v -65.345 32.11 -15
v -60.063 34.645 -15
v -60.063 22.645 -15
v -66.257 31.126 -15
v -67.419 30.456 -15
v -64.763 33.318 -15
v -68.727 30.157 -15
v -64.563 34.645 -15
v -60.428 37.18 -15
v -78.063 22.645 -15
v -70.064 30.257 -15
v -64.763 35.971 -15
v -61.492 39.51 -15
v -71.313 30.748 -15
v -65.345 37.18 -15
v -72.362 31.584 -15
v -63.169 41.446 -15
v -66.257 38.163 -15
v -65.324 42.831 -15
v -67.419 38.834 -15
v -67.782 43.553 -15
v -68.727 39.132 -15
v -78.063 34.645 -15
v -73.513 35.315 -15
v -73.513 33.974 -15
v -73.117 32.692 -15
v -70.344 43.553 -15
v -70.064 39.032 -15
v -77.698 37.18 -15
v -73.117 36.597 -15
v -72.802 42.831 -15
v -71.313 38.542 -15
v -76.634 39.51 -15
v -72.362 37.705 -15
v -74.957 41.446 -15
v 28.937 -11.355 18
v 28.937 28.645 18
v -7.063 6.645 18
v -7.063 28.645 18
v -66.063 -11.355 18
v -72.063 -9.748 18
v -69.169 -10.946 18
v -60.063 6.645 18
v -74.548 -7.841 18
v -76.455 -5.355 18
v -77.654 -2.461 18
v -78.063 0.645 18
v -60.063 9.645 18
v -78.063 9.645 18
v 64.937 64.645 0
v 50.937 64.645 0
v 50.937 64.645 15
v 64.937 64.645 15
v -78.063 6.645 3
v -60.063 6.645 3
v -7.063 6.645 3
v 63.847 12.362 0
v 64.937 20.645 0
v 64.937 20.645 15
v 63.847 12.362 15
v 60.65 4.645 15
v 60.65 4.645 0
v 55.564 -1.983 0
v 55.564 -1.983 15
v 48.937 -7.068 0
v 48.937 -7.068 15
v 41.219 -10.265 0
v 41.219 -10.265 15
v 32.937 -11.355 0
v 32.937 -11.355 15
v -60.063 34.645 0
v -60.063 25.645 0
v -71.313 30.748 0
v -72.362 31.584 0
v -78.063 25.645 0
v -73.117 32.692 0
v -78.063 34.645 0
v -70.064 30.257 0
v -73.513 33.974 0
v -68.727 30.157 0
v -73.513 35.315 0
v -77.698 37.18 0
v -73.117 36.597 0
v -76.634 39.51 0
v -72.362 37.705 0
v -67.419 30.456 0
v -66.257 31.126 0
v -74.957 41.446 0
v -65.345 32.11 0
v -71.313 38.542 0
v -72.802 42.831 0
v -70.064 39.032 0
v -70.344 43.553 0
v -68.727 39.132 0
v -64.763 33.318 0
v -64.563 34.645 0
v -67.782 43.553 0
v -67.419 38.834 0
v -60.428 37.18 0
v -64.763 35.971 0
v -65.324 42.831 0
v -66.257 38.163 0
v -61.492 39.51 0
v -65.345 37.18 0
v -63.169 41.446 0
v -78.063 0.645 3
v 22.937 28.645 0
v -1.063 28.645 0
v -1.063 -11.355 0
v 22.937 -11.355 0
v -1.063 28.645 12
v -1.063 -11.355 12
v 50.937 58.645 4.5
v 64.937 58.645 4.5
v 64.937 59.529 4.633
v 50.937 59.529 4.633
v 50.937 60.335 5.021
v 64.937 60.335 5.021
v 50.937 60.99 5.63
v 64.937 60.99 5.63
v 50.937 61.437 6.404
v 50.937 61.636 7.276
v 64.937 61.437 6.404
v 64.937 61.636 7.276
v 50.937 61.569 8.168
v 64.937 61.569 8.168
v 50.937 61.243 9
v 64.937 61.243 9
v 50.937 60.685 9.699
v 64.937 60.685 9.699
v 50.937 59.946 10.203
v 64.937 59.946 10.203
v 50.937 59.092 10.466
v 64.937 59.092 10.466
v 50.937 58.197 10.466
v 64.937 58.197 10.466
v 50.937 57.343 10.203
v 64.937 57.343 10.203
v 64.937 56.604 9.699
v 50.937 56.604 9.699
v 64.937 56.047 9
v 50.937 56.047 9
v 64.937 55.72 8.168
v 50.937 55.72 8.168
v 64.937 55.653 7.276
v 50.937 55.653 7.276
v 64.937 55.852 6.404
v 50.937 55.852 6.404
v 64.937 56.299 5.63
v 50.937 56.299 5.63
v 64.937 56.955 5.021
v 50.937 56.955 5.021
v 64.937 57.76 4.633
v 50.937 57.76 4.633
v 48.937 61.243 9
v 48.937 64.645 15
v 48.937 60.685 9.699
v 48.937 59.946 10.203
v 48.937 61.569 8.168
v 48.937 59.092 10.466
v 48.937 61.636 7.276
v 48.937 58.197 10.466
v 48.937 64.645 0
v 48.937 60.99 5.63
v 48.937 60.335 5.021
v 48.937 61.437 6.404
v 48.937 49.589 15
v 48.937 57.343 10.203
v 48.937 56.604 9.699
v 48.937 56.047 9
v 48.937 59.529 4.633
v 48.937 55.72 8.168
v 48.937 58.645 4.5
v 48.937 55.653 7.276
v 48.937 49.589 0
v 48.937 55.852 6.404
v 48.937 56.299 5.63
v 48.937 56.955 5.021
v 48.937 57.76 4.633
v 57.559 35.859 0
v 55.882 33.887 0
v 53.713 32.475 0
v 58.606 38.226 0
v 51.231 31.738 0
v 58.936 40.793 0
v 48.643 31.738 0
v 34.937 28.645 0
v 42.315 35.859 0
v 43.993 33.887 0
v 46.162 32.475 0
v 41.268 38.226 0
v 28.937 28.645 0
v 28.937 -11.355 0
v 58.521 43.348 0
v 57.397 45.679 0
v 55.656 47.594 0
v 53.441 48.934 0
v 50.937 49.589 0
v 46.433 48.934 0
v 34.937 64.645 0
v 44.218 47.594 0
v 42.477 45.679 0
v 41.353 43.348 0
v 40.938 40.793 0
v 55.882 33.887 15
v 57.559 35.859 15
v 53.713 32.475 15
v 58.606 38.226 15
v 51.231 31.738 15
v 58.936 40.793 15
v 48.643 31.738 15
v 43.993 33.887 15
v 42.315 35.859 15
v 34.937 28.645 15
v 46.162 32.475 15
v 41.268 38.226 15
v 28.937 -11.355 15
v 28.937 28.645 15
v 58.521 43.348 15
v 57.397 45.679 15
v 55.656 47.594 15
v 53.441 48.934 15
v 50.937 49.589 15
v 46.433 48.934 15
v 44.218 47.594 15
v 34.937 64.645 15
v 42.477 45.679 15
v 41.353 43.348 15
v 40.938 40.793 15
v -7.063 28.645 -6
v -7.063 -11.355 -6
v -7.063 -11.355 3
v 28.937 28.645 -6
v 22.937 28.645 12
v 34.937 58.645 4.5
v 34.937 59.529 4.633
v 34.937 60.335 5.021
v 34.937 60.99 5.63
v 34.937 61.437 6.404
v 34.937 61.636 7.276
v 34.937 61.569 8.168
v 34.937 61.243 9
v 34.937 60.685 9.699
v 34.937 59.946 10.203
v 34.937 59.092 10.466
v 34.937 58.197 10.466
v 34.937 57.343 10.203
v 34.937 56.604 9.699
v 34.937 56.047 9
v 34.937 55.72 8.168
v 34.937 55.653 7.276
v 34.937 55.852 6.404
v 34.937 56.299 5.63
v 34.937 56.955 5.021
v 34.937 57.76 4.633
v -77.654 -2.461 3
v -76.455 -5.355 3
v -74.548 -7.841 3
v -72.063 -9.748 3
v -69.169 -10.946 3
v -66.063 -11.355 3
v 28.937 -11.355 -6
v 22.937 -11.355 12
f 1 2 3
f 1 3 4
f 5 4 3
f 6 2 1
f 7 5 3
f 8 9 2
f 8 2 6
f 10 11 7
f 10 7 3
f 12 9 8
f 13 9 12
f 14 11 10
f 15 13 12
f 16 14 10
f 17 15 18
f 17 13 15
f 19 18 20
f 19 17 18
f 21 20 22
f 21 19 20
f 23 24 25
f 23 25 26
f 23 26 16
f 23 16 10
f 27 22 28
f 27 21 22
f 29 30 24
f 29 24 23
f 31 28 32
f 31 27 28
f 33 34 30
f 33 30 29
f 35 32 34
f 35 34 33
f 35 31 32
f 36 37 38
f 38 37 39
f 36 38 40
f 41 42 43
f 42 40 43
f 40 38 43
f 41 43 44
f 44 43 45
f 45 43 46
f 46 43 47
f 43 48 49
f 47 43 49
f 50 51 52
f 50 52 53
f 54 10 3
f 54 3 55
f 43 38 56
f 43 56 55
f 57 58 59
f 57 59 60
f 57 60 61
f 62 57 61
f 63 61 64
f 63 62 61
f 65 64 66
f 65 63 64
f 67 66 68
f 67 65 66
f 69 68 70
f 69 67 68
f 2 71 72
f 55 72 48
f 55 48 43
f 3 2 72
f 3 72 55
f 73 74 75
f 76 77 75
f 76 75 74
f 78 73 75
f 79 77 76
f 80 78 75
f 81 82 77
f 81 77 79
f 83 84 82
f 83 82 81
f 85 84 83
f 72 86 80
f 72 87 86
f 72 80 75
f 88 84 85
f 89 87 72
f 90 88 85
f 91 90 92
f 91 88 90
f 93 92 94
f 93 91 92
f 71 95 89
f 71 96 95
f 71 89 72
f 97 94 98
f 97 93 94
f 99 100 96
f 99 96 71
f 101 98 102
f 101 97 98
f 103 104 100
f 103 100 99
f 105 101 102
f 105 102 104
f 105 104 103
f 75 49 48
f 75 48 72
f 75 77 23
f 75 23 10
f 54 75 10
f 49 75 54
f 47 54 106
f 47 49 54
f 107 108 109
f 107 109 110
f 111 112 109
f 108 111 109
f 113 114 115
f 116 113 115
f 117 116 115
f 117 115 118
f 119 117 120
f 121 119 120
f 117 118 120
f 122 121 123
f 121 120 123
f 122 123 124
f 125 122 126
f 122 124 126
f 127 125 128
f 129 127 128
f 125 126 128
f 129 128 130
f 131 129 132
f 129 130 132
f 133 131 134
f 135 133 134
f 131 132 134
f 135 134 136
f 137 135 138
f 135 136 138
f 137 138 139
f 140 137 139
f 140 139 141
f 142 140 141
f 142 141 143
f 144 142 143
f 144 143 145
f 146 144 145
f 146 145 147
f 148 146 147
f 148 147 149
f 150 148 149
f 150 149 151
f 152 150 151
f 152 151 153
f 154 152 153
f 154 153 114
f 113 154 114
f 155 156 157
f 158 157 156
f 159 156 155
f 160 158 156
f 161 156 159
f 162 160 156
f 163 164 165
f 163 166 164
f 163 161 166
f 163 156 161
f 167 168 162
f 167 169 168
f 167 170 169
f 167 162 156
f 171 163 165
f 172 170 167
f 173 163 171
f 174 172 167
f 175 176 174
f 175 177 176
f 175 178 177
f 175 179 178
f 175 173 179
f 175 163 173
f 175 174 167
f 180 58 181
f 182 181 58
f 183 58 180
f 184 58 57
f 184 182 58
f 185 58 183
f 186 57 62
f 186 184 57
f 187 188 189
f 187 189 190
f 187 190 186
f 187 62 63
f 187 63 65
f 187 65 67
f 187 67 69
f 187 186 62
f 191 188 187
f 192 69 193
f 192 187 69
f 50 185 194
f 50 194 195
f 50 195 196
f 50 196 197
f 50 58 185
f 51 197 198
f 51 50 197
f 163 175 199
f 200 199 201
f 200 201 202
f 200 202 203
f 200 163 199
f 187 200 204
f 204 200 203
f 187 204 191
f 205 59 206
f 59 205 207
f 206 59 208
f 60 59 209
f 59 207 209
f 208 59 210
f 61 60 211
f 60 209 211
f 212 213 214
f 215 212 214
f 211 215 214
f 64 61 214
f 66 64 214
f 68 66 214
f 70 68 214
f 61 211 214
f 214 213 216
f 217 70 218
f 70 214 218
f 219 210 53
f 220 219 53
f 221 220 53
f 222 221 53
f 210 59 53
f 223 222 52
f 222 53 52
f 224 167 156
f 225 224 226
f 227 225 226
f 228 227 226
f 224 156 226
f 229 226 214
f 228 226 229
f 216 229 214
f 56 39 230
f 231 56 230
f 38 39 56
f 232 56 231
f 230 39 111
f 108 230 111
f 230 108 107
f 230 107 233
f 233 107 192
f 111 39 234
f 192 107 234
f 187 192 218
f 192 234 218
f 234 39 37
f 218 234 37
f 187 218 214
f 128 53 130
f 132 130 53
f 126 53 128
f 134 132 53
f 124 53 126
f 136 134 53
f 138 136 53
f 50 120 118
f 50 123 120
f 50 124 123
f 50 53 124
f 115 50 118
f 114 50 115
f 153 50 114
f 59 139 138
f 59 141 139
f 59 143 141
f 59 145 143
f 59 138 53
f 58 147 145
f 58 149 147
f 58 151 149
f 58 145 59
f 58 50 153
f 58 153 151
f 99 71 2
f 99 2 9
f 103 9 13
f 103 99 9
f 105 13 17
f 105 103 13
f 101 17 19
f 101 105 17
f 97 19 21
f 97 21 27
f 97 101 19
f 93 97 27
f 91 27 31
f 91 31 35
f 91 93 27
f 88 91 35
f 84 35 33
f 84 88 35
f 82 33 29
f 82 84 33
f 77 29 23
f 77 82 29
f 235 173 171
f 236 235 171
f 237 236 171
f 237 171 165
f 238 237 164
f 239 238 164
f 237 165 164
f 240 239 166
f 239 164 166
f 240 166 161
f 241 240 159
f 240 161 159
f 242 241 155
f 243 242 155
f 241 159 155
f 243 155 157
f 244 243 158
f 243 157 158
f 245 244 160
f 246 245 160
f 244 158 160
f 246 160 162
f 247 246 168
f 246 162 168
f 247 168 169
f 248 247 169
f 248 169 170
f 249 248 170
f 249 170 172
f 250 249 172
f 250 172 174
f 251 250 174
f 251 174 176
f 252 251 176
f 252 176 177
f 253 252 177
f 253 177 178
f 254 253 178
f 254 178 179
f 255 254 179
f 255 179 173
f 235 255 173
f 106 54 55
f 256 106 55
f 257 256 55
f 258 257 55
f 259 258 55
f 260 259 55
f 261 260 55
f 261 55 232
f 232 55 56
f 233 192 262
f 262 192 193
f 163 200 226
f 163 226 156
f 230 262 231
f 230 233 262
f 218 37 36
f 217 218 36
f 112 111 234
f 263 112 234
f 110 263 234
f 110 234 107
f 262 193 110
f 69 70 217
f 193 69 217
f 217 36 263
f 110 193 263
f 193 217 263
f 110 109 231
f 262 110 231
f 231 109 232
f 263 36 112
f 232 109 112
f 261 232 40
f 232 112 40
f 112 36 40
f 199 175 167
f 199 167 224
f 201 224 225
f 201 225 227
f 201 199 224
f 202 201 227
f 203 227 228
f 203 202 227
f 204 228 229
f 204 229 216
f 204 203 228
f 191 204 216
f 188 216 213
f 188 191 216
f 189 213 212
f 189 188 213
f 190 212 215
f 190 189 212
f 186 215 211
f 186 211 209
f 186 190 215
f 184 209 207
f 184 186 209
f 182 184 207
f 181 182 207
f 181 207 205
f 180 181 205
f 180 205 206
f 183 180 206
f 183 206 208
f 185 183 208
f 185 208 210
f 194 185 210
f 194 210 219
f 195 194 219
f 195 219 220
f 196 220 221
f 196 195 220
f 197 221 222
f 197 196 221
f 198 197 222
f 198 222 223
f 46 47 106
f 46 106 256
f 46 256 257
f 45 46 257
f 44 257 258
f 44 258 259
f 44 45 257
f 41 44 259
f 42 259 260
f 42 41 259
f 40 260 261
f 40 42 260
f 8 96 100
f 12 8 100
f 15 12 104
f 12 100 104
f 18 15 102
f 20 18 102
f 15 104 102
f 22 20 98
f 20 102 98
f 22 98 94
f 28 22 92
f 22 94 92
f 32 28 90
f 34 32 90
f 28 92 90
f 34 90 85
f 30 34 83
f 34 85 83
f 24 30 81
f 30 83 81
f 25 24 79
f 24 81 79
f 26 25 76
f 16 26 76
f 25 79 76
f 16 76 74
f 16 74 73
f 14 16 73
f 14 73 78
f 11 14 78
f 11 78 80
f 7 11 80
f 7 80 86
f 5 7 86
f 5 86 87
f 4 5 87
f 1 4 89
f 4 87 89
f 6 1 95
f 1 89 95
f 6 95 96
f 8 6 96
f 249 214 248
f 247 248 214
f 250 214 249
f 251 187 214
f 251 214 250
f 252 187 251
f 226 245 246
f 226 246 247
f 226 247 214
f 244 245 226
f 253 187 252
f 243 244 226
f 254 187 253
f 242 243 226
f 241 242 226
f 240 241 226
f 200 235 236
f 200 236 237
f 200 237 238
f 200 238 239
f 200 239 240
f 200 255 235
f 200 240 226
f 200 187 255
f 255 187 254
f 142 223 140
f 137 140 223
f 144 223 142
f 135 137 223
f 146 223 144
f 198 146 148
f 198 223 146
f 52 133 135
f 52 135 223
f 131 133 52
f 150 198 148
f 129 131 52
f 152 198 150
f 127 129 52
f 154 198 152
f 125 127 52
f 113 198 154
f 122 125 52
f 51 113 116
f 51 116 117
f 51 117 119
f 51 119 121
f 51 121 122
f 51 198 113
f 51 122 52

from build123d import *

# Parameters (mm, degrees)
SKETCH2_R            = 4.5
BOSS_EXTRUDE1_DEPTH  = 15
SKETCH6_W            = 18
SKETCH6_H            = 16
SKETCH6_H_2          = 3
BOSS_EXTRUDE9_DEPTH  = 33
CUT_EXTRUDE2_DEPTH   = 33
BOSS_EXTRUDE11_DEPTH = 15
BOSS_EXTRUDE13_DEPTH = 24
SKETCH20_W           = 24
SKETCH20_H           = 12
CUT_EXTRUDE3_DEPTH   = 57
BOSS_EXTRUDE15_DEPTH = 15
SKETCH22_R           = 3
CUT_EXTRUDE4_DEPTH   = 47


with BuildPart() as part:
    # Sketch2 → Boss-Extrude1 (new body)
    with BuildSketch(Plane.XY):
        with BuildLine():
            Line((-78.062958061, 34.644624266), (-78.062958061, 25.644624266))
            Line((-78.062958061, 25.644624266), (-60.062958061, 25.644624266))
            Line((-60.062958061, 25.644624266), (-60.062958061, 34.644624266))
            ThreePointArc((-60.062958061, 34.644624266), (-69.062958061, 43.644624266), (-78.062958061, 34.644624266))
        make_face()
        with Locations((-69.062958061, 34.644624266)):
            Circle(SKETCH2_R, mode=Mode.SUBTRACT)
    extrude(amount=-BOSS_EXTRUDE1_DEPTH)

    # Sketch6 → Boss-Extrude9 (add)
    with BuildSketch(Plane(origin=(0, 0, -15), x_dir=(-1, 0, 0), z_dir=(0, 0, -1))):
        with Locations((69.062958061, 14.644624266)):
            Rectangle(SKETCH6_W, SKETCH6_H)
        with Locations((69.062958061, 24.144624266)):
            Rectangle(SKETCH6_W, SKETCH6_H_2)
    extrude(amount=-BOSS_EXTRUDE9_DEPTH)

    # Sketch15 → Cut-Extrude2 (cut)
    with BuildSketch(Plane.ZY.offset(78.062958061)):
        Polygon((-15, 6.644624266), (-15, 22.644624266), (3, 6.644624266), align=None)
        Polygon((18, 9.644624266), (0, 25.644624266), (18, 25.644624266), align=None)
    extrude(amount=-CUT_EXTRUDE2_DEPTH, mode=Mode.SUBTRACT)

    # Sketch16 → Boss-Extrude11 (add)
    with BuildSketch(Plane.XY.offset(18)):
        with BuildLine():
            Line((-78.062958061, 6.644624266), (-78.062958061, 0.644624266))
            ThreePointArc((-78.062958061, 0.644624266), (-74.548239436, -7.840657108), (-66.062958061, -11.355375734))
            Line((-66.062958061, -11.355375734), (-7.062958061, -11.355375734))
            Line((-7.062958061, -11.355375734), (-7.062958061, 6.644624266))
            Line((-7.062958061, 6.644624266), (-78.062958061, 6.644624266))
        make_face()
    extrude(amount=-BOSS_EXTRUDE11_DEPTH)

    # Sketch18 → Boss-Extrude13 (add)
    with BuildSketch(Plane.XY.offset(18)):
        Polygon((28.937041939, -11.355375734), (-7.062958061, -11.355375734), (-7.062958061, 6.644624266), (-7.062958061, 28.644624266), (28.937041939, 28.644624266), align=None)
    extrude(amount=-BOSS_EXTRUDE13_DEPTH)

    # Sketch20 → Cut-Extrude3 (cut)
    with BuildSketch(Plane(origin=(0, 28.644624266, 0), x_dir=(1, 0, 0), z_dir=(0, 1, 0))):
        with Locations((10.937041939, -6)):
            Rectangle(SKETCH20_W, SKETCH20_H)
    extrude(amount=-CUT_EXTRUDE3_DEPTH, mode=Mode.SUBTRACT)

    # Sketch21 → Boss-Extrude15 (add)
    with BuildSketch(Plane.XY):
        with BuildLine():
            Line((22.937041939, 28.644624266), (34.937041939, 28.644624266))
            Line((34.937041939, 28.644624266), (34.937041939, 64.644624266))
            Line((34.937041939, 64.644624266), (48.937041939, 64.644624266))
            Line((48.937041939, 64.644624266), (48.937041939, 49.588896176))
            ThreePointArc((48.937041939, 49.588896176), (49.937041939, 31.644624266), (50.937041939, 49.588896176))
            Line((50.937041939, 49.588896176), (50.937041939, 64.644624266))
            Line((50.937041939, 64.644624266), (64.937041939, 64.644624266))
            Line((64.937041939, 64.644624266), (64.937041939, 20.644624266))
            ThreePointArc((64.937041939, 20.644624266), (55.564458937, -1.982792732), (32.937041939, -11.355375734))
            Line((32.937041939, -11.355375734), (22.937041939, -11.355375734))
            Line((22.937041939, -11.355375734), (22.937041939, 28.644624266))
        make_face()
    extrude(amount=BOSS_EXTRUDE15_DEPTH)

    # Sketch22 → Cut-Extrude4 (cut)
    with BuildSketch(Plane(origin=(64.937041939, 0, 0), x_dir=(0, 0, -1), z_dir=(1, 0, 0))):
        with Locations((-7.5, 58.644624266)):
            Circle(SKETCH22_R)
    extrude(amount=-CUT_EXTRUDE4_DEPTH, mode=Mode.SUBTRACT)


solid = part.part
